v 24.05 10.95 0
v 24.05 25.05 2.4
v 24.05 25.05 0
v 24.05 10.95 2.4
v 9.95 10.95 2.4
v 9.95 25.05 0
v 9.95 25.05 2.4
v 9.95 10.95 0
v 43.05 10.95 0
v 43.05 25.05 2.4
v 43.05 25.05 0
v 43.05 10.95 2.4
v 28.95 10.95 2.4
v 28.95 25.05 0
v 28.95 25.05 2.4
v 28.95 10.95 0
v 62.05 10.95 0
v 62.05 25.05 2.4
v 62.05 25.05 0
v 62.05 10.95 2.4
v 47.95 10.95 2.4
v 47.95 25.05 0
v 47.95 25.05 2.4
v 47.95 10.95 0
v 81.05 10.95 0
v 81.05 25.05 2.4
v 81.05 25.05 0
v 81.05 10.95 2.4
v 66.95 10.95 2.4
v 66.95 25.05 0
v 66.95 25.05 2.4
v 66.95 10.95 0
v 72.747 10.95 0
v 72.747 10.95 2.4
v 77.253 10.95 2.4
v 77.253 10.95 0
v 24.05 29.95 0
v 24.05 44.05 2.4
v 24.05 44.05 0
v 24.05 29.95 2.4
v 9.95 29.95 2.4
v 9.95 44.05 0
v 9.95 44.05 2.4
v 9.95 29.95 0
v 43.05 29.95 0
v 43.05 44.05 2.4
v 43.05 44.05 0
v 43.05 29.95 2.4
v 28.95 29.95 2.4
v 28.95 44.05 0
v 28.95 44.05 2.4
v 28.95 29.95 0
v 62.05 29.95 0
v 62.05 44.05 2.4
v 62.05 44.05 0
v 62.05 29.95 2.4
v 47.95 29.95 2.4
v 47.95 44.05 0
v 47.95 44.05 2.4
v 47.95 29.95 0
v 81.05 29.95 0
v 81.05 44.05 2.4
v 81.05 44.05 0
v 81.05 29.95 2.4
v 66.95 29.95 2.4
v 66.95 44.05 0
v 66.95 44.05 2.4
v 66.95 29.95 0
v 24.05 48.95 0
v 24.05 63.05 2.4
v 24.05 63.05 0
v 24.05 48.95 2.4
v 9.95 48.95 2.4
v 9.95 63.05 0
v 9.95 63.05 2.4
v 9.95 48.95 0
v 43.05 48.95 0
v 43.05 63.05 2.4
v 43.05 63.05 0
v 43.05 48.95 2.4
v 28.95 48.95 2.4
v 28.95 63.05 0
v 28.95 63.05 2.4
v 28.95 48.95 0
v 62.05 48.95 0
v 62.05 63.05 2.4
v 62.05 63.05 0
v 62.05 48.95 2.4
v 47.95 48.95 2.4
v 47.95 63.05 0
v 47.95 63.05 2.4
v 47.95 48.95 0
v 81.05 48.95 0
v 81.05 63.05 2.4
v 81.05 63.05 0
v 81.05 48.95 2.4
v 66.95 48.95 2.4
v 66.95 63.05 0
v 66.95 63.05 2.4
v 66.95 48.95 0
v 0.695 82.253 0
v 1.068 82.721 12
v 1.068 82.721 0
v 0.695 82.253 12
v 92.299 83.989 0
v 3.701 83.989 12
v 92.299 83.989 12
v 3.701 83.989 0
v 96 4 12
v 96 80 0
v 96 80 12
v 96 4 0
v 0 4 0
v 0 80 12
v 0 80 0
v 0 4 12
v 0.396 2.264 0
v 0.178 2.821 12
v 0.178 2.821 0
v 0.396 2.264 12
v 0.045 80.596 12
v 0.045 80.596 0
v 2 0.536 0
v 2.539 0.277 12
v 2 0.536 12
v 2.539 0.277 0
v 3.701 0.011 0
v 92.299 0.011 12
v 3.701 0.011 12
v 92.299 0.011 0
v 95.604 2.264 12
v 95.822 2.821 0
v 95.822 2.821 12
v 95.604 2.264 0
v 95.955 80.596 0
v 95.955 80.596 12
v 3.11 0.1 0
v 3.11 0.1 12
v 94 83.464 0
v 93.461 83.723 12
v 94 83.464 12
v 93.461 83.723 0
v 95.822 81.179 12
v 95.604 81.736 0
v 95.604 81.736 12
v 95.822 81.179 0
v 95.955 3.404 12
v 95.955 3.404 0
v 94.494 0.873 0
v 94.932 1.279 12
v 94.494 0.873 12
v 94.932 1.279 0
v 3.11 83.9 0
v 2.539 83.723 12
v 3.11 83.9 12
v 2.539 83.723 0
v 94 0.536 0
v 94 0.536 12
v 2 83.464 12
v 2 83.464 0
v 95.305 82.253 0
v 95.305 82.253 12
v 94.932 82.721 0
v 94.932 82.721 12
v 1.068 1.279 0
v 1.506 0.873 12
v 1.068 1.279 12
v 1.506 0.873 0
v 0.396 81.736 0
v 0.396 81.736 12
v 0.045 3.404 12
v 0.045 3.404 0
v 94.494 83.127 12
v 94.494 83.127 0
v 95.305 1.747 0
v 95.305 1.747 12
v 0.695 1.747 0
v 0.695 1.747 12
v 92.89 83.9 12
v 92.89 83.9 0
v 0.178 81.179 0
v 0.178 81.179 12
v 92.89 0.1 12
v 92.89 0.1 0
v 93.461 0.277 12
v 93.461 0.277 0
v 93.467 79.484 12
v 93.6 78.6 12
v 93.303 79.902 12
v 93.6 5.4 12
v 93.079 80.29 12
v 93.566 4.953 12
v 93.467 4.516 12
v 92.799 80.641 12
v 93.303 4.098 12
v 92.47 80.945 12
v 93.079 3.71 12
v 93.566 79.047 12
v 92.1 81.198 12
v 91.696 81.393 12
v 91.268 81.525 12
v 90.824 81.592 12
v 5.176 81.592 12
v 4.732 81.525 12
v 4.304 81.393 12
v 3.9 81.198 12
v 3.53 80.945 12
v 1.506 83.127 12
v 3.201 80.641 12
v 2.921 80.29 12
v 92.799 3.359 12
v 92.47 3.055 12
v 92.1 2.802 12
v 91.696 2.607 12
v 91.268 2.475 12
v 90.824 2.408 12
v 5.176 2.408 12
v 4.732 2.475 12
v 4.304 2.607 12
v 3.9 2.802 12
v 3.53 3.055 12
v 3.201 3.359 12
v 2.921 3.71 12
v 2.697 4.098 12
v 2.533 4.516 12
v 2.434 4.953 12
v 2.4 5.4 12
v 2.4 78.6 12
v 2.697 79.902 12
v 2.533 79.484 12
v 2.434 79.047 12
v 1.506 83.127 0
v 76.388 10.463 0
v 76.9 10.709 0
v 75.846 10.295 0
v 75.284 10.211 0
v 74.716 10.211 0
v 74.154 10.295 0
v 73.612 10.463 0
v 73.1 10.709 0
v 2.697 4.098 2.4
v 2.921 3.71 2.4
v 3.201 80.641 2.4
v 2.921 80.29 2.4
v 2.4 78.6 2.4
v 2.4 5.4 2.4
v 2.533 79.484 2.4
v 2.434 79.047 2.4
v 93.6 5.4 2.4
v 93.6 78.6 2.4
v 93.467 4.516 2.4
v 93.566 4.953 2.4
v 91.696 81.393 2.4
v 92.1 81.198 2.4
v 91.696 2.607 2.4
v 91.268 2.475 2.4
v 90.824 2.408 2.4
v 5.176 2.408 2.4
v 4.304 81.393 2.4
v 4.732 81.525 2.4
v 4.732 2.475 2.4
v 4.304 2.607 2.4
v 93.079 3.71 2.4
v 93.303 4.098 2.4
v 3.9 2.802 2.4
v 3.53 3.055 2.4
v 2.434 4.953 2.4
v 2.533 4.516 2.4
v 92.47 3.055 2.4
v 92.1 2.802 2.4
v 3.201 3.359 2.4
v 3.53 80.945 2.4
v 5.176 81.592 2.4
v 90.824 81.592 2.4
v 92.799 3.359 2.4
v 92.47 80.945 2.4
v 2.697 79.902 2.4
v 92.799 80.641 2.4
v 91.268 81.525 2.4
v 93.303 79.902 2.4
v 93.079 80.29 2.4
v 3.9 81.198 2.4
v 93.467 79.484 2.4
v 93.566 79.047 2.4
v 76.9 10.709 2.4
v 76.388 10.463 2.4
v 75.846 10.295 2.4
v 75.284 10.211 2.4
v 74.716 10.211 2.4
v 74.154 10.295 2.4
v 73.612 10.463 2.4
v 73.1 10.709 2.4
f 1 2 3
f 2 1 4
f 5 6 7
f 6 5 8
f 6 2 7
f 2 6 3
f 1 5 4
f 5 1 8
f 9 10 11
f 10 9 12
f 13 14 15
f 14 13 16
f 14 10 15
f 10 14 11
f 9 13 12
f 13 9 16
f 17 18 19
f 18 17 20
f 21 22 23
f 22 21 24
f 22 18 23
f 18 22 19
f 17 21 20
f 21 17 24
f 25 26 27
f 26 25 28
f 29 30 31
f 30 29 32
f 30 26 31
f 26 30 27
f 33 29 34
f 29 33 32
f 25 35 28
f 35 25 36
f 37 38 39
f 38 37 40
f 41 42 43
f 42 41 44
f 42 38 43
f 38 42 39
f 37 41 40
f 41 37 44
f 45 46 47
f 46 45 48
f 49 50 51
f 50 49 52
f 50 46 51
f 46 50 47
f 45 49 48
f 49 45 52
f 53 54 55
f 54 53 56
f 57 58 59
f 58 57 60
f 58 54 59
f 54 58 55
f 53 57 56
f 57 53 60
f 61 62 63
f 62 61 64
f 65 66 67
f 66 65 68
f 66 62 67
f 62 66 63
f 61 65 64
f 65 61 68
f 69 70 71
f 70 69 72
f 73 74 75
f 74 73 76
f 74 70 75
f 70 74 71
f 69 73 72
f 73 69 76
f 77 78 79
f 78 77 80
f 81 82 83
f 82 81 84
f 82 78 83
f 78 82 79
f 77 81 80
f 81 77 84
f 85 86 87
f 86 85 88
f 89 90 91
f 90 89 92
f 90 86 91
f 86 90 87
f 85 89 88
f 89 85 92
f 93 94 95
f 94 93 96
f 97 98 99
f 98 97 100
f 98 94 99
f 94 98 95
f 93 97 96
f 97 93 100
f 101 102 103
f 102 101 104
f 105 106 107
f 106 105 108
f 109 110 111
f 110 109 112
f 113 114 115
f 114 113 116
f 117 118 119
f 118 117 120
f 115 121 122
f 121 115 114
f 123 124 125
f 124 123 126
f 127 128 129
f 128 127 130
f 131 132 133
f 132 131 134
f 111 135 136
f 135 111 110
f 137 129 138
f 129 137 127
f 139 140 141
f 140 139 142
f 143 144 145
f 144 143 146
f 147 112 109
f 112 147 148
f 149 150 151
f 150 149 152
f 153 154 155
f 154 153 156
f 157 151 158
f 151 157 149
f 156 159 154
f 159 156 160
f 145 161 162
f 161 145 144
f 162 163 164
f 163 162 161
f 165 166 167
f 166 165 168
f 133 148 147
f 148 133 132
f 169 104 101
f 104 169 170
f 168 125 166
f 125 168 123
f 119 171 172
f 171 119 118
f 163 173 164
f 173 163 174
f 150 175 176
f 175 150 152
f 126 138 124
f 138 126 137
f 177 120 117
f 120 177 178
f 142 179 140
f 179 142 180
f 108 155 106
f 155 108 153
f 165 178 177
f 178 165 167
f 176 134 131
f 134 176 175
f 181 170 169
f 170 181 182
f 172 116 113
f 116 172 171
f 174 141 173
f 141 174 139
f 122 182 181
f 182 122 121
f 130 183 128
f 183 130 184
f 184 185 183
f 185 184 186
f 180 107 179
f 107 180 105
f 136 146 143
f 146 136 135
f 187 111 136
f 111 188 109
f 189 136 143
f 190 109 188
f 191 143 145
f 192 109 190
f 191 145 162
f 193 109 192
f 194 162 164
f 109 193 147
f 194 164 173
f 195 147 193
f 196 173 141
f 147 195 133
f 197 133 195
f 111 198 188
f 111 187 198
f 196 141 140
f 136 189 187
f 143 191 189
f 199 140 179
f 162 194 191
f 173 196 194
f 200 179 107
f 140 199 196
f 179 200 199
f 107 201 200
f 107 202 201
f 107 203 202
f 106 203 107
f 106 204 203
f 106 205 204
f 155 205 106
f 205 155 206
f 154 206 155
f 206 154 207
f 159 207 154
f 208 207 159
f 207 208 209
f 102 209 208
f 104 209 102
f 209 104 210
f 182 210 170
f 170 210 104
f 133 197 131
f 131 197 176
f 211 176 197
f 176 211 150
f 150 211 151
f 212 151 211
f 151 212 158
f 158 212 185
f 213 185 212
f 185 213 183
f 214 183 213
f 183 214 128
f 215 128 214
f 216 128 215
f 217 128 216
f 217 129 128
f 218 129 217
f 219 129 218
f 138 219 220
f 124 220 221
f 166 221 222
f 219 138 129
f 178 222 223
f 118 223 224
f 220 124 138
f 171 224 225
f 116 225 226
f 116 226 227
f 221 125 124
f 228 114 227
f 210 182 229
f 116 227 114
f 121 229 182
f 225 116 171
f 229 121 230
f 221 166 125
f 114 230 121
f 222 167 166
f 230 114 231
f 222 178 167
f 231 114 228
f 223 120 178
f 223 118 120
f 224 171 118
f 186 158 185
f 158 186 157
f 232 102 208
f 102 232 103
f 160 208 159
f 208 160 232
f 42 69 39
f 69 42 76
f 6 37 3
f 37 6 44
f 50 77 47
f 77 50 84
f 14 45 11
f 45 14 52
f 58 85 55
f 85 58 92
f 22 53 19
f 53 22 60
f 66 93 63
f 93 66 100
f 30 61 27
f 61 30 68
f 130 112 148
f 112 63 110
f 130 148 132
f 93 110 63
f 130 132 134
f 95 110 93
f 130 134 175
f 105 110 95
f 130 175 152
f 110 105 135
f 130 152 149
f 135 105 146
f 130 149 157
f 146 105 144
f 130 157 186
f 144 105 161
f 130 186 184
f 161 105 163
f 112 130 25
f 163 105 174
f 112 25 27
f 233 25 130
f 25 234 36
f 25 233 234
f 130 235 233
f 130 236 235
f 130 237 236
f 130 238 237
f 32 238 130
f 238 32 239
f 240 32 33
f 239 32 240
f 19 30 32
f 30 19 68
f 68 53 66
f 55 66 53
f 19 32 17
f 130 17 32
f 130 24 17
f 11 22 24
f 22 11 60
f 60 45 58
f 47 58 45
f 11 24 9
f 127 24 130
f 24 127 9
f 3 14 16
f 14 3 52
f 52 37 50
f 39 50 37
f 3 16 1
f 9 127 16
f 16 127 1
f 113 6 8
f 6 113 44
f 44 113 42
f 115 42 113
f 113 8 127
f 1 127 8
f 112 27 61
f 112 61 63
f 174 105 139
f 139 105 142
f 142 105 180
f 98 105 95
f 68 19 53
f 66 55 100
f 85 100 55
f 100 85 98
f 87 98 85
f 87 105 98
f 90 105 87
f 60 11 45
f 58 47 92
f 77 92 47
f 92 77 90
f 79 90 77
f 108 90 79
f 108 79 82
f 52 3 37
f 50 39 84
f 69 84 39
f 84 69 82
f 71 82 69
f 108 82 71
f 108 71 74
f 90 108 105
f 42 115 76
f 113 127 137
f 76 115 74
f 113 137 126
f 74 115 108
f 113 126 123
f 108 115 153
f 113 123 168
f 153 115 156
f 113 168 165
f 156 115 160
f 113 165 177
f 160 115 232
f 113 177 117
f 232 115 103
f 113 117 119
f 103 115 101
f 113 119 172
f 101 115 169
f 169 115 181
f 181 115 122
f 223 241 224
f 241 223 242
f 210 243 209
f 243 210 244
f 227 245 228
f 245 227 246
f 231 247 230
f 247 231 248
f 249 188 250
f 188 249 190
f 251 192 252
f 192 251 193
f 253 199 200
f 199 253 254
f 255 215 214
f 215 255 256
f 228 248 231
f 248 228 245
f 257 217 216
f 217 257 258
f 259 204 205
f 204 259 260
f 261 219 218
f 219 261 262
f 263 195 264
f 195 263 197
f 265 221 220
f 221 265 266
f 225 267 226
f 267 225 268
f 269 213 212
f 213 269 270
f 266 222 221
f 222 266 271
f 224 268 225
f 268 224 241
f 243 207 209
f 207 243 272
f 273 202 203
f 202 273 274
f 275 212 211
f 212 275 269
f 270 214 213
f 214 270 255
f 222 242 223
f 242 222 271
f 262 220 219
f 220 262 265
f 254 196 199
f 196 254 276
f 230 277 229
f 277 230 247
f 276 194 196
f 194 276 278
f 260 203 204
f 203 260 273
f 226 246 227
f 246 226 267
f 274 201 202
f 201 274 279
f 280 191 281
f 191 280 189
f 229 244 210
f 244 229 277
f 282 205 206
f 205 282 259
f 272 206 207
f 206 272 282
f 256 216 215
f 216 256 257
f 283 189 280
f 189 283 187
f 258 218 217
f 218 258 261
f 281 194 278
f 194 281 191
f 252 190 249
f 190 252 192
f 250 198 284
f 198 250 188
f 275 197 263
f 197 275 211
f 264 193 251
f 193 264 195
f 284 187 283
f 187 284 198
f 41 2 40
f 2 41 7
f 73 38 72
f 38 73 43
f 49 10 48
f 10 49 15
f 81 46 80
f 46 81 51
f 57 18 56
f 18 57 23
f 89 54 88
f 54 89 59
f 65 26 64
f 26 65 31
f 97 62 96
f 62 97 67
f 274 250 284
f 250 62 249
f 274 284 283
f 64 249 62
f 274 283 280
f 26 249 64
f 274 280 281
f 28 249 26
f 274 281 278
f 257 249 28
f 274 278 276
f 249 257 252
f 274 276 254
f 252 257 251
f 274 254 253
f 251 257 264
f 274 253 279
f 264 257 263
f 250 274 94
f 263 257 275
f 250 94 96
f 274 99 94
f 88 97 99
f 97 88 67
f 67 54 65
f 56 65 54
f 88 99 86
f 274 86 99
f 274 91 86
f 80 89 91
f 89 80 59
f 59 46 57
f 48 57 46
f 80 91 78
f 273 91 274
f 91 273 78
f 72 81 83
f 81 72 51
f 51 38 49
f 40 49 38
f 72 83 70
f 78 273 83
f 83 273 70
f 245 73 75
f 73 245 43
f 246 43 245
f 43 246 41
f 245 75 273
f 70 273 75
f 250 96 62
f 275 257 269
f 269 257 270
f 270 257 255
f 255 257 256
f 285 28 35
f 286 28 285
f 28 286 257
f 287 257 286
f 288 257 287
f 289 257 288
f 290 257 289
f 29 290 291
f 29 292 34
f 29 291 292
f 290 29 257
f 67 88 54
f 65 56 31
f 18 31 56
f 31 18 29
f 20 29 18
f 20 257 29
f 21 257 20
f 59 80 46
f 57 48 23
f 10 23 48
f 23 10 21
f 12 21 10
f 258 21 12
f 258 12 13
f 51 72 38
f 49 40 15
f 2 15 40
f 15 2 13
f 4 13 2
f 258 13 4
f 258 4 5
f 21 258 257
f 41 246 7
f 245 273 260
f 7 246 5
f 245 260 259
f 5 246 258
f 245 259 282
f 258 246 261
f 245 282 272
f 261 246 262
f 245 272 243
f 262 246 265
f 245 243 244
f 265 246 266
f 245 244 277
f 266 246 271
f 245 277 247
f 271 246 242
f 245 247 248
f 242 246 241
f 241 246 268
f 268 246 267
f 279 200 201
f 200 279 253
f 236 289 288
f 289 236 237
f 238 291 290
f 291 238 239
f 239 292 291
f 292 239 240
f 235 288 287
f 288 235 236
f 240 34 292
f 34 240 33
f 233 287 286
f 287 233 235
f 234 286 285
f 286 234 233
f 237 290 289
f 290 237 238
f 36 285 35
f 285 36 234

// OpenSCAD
// Stardusts Hackpad parametric case sketch.
// Dimensions are a starting point for KiCad-fit validation.

$fn = 42;

case_width = 96;
case_height = 84;
case_depth = 12;
wall = 2.4;
corner = 4;
switch_pitch = 19;
switch_cutout = 14.1;

module rounded_box(width, height, depth, radius) {
  hull() {
    for (x = [radius, width - radius]) {
      for (y = [radius, height - radius]) {
        translate([x, y, 0]) cylinder(h = depth, r = radius);
      }
    }
  }
}

module switch_grid() {
  for (row = [0:2]) {
    for (col = [0:3]) {
      translate([17 + col * switch_pitch, 18 + row * switch_pitch, -1])
        cube([switch_cutout, switch_cutout, case_depth + 2], center = true);
    }
  }
}

module encoder_cutout() {
  translate([75, 14, -1]) cylinder(h = case_depth + 2, r = 3.8);
}

difference() {
  rounded_box(case_width, case_height, case_depth, corner);
  translate([wall, wall, wall])
    rounded_box(case_width - wall * 2, case_height - wall * 2, case_depth, corner - 1);
  switch_grid();
  encoder_cutout();
}
